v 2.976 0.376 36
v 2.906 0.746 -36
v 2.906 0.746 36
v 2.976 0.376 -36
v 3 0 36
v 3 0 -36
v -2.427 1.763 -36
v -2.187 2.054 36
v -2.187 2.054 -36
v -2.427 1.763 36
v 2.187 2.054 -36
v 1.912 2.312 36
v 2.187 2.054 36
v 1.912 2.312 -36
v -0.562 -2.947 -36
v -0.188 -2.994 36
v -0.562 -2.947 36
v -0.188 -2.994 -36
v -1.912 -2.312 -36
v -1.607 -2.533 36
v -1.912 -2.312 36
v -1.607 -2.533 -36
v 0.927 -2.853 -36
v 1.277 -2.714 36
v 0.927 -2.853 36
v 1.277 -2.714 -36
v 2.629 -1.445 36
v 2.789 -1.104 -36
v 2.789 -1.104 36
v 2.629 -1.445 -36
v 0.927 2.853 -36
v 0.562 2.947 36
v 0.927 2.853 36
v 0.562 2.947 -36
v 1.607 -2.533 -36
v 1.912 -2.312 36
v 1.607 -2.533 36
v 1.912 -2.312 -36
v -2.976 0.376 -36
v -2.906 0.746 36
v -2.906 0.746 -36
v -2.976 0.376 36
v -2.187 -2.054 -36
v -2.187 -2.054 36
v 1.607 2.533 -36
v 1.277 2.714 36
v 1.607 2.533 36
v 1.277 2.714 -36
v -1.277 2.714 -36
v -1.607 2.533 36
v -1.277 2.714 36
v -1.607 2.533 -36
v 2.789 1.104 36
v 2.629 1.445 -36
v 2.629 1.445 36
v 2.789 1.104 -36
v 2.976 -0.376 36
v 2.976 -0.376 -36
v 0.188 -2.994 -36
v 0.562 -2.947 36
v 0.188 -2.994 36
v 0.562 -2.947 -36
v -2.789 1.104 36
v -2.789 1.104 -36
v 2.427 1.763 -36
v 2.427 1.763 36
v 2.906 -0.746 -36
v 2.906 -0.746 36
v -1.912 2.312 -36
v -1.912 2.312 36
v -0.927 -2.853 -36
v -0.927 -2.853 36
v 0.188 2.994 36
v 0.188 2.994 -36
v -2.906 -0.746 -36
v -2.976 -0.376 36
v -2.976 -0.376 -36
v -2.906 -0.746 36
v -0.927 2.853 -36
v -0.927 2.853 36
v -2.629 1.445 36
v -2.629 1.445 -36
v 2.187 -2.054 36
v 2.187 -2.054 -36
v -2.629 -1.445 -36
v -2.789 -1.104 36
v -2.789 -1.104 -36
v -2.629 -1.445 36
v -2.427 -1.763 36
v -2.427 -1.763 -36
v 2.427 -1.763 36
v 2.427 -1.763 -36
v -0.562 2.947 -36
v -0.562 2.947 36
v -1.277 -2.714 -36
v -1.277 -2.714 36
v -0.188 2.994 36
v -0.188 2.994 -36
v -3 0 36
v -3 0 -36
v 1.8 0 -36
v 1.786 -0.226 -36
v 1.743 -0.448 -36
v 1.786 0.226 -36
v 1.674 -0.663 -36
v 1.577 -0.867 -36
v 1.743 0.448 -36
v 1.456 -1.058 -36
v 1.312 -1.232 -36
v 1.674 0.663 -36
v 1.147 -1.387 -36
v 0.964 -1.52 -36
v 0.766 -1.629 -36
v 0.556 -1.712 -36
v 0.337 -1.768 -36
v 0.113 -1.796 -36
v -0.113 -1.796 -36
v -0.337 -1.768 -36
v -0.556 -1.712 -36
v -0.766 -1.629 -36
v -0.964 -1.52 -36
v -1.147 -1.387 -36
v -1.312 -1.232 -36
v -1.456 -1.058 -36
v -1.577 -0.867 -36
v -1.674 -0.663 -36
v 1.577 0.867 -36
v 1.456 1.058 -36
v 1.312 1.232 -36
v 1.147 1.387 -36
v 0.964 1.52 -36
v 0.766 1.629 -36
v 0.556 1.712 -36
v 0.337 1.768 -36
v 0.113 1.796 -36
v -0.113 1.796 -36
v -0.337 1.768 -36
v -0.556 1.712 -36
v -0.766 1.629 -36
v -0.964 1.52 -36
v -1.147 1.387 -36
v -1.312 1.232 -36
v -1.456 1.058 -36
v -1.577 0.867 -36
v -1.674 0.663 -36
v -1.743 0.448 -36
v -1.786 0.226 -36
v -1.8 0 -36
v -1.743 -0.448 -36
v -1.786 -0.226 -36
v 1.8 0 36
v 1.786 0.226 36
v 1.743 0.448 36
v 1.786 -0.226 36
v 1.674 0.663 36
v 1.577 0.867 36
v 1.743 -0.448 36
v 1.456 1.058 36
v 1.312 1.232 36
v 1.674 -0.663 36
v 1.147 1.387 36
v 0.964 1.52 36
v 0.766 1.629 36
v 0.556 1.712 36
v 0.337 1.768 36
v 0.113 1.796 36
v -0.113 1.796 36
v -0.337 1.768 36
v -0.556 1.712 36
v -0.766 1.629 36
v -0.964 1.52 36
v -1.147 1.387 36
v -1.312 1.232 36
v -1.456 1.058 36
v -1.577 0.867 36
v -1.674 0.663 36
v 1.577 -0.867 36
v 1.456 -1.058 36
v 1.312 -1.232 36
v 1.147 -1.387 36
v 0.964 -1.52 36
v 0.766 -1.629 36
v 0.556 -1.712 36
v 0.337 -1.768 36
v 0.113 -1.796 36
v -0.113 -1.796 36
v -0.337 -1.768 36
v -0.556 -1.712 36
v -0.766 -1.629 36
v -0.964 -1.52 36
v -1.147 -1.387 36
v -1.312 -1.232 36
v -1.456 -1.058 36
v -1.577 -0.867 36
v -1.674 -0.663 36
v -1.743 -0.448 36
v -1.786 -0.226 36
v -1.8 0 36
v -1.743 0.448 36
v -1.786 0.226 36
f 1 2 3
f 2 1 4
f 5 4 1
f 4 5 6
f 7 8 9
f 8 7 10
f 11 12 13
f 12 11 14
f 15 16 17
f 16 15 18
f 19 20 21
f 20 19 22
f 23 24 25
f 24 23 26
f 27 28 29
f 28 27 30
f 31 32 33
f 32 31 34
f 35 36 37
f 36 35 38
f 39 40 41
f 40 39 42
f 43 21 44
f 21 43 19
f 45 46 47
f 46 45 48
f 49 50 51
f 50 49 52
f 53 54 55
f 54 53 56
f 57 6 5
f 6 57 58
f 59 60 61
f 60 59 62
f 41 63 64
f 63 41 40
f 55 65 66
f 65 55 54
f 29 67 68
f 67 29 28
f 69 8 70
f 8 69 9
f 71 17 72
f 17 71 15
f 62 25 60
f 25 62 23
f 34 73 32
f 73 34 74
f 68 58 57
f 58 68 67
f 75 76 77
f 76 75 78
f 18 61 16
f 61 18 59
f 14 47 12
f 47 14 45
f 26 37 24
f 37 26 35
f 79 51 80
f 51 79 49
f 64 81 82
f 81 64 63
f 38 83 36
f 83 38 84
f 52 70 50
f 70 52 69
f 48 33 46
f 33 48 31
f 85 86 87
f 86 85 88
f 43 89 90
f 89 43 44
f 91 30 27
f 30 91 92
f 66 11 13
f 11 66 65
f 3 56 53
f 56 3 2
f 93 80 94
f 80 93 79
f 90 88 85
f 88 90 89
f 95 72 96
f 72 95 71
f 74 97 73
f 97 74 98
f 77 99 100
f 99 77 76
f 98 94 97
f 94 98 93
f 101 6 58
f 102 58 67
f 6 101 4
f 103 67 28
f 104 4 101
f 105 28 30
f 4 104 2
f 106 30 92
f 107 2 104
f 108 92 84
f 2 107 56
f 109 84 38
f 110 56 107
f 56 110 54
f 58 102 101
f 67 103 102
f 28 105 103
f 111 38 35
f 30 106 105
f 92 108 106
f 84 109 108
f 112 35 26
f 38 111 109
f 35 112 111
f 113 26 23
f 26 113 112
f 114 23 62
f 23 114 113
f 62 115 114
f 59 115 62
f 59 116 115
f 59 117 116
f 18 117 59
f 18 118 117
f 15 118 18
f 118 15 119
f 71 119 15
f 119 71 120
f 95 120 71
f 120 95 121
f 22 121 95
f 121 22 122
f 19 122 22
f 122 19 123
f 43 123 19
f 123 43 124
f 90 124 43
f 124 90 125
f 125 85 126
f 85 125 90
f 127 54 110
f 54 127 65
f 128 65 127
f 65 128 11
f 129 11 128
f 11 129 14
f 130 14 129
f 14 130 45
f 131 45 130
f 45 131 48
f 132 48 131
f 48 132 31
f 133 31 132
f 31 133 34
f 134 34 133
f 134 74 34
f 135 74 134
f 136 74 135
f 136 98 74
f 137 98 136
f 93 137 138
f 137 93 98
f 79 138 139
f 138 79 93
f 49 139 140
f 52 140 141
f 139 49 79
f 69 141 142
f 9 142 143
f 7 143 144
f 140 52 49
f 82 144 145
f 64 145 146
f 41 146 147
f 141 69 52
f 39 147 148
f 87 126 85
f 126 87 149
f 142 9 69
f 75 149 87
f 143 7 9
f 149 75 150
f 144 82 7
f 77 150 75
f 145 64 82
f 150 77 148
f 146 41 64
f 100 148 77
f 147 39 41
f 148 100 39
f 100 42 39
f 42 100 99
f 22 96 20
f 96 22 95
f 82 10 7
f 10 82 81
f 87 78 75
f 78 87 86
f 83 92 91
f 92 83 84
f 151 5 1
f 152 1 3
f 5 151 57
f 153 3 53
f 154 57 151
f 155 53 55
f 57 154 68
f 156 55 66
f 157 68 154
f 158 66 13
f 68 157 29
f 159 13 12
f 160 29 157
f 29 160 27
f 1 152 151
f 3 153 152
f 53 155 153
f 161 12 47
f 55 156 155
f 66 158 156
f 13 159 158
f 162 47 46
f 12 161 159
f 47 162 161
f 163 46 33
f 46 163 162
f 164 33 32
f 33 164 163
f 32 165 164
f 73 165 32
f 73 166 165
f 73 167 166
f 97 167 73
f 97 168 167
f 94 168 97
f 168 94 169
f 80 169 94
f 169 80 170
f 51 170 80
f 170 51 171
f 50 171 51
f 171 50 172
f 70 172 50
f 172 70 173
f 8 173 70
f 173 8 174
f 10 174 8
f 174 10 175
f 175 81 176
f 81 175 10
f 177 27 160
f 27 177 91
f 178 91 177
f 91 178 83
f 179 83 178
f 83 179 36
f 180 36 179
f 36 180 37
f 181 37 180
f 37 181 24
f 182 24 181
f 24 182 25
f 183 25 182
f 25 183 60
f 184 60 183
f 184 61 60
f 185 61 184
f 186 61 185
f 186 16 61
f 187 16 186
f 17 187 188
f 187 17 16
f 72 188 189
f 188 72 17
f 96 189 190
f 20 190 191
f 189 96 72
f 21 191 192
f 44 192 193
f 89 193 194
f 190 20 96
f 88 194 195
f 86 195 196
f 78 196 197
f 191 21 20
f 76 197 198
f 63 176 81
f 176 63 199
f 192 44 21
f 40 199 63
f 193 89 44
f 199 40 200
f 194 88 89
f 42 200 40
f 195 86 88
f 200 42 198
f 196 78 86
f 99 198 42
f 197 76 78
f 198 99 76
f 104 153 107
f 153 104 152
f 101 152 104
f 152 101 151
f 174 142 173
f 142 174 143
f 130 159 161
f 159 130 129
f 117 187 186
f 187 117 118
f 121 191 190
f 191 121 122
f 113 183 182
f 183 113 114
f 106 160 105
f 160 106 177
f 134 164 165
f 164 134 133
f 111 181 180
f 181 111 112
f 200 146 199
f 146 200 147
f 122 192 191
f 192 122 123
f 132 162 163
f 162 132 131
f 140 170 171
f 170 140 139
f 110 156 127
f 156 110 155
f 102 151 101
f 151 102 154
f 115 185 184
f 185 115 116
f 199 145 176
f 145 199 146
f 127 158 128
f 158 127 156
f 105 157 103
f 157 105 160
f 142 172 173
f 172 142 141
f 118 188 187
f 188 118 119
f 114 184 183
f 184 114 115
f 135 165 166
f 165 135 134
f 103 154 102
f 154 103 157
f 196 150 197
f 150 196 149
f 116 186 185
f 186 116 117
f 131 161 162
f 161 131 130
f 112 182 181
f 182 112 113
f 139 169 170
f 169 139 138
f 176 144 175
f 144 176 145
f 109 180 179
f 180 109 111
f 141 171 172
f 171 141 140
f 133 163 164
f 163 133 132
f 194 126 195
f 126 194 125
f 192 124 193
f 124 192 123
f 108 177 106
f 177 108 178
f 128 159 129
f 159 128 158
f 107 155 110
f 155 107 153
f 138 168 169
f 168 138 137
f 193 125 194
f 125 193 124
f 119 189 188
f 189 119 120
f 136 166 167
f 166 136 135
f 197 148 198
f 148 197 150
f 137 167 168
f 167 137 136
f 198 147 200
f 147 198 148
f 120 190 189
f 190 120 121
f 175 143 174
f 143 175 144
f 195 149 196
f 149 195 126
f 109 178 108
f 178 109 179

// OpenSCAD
$fn = 50;


difference() {
	union() {
		translate(v = [0, 0, -36.0000000000]) {
			cylinder(h = 72, r = 3.0000000000);
		}
	}
	union() {
		#translate(v = [0, 0, -100.0000000000]) {
			cylinder(h = 200, r = 1.8000000000);
		}
	}
}
